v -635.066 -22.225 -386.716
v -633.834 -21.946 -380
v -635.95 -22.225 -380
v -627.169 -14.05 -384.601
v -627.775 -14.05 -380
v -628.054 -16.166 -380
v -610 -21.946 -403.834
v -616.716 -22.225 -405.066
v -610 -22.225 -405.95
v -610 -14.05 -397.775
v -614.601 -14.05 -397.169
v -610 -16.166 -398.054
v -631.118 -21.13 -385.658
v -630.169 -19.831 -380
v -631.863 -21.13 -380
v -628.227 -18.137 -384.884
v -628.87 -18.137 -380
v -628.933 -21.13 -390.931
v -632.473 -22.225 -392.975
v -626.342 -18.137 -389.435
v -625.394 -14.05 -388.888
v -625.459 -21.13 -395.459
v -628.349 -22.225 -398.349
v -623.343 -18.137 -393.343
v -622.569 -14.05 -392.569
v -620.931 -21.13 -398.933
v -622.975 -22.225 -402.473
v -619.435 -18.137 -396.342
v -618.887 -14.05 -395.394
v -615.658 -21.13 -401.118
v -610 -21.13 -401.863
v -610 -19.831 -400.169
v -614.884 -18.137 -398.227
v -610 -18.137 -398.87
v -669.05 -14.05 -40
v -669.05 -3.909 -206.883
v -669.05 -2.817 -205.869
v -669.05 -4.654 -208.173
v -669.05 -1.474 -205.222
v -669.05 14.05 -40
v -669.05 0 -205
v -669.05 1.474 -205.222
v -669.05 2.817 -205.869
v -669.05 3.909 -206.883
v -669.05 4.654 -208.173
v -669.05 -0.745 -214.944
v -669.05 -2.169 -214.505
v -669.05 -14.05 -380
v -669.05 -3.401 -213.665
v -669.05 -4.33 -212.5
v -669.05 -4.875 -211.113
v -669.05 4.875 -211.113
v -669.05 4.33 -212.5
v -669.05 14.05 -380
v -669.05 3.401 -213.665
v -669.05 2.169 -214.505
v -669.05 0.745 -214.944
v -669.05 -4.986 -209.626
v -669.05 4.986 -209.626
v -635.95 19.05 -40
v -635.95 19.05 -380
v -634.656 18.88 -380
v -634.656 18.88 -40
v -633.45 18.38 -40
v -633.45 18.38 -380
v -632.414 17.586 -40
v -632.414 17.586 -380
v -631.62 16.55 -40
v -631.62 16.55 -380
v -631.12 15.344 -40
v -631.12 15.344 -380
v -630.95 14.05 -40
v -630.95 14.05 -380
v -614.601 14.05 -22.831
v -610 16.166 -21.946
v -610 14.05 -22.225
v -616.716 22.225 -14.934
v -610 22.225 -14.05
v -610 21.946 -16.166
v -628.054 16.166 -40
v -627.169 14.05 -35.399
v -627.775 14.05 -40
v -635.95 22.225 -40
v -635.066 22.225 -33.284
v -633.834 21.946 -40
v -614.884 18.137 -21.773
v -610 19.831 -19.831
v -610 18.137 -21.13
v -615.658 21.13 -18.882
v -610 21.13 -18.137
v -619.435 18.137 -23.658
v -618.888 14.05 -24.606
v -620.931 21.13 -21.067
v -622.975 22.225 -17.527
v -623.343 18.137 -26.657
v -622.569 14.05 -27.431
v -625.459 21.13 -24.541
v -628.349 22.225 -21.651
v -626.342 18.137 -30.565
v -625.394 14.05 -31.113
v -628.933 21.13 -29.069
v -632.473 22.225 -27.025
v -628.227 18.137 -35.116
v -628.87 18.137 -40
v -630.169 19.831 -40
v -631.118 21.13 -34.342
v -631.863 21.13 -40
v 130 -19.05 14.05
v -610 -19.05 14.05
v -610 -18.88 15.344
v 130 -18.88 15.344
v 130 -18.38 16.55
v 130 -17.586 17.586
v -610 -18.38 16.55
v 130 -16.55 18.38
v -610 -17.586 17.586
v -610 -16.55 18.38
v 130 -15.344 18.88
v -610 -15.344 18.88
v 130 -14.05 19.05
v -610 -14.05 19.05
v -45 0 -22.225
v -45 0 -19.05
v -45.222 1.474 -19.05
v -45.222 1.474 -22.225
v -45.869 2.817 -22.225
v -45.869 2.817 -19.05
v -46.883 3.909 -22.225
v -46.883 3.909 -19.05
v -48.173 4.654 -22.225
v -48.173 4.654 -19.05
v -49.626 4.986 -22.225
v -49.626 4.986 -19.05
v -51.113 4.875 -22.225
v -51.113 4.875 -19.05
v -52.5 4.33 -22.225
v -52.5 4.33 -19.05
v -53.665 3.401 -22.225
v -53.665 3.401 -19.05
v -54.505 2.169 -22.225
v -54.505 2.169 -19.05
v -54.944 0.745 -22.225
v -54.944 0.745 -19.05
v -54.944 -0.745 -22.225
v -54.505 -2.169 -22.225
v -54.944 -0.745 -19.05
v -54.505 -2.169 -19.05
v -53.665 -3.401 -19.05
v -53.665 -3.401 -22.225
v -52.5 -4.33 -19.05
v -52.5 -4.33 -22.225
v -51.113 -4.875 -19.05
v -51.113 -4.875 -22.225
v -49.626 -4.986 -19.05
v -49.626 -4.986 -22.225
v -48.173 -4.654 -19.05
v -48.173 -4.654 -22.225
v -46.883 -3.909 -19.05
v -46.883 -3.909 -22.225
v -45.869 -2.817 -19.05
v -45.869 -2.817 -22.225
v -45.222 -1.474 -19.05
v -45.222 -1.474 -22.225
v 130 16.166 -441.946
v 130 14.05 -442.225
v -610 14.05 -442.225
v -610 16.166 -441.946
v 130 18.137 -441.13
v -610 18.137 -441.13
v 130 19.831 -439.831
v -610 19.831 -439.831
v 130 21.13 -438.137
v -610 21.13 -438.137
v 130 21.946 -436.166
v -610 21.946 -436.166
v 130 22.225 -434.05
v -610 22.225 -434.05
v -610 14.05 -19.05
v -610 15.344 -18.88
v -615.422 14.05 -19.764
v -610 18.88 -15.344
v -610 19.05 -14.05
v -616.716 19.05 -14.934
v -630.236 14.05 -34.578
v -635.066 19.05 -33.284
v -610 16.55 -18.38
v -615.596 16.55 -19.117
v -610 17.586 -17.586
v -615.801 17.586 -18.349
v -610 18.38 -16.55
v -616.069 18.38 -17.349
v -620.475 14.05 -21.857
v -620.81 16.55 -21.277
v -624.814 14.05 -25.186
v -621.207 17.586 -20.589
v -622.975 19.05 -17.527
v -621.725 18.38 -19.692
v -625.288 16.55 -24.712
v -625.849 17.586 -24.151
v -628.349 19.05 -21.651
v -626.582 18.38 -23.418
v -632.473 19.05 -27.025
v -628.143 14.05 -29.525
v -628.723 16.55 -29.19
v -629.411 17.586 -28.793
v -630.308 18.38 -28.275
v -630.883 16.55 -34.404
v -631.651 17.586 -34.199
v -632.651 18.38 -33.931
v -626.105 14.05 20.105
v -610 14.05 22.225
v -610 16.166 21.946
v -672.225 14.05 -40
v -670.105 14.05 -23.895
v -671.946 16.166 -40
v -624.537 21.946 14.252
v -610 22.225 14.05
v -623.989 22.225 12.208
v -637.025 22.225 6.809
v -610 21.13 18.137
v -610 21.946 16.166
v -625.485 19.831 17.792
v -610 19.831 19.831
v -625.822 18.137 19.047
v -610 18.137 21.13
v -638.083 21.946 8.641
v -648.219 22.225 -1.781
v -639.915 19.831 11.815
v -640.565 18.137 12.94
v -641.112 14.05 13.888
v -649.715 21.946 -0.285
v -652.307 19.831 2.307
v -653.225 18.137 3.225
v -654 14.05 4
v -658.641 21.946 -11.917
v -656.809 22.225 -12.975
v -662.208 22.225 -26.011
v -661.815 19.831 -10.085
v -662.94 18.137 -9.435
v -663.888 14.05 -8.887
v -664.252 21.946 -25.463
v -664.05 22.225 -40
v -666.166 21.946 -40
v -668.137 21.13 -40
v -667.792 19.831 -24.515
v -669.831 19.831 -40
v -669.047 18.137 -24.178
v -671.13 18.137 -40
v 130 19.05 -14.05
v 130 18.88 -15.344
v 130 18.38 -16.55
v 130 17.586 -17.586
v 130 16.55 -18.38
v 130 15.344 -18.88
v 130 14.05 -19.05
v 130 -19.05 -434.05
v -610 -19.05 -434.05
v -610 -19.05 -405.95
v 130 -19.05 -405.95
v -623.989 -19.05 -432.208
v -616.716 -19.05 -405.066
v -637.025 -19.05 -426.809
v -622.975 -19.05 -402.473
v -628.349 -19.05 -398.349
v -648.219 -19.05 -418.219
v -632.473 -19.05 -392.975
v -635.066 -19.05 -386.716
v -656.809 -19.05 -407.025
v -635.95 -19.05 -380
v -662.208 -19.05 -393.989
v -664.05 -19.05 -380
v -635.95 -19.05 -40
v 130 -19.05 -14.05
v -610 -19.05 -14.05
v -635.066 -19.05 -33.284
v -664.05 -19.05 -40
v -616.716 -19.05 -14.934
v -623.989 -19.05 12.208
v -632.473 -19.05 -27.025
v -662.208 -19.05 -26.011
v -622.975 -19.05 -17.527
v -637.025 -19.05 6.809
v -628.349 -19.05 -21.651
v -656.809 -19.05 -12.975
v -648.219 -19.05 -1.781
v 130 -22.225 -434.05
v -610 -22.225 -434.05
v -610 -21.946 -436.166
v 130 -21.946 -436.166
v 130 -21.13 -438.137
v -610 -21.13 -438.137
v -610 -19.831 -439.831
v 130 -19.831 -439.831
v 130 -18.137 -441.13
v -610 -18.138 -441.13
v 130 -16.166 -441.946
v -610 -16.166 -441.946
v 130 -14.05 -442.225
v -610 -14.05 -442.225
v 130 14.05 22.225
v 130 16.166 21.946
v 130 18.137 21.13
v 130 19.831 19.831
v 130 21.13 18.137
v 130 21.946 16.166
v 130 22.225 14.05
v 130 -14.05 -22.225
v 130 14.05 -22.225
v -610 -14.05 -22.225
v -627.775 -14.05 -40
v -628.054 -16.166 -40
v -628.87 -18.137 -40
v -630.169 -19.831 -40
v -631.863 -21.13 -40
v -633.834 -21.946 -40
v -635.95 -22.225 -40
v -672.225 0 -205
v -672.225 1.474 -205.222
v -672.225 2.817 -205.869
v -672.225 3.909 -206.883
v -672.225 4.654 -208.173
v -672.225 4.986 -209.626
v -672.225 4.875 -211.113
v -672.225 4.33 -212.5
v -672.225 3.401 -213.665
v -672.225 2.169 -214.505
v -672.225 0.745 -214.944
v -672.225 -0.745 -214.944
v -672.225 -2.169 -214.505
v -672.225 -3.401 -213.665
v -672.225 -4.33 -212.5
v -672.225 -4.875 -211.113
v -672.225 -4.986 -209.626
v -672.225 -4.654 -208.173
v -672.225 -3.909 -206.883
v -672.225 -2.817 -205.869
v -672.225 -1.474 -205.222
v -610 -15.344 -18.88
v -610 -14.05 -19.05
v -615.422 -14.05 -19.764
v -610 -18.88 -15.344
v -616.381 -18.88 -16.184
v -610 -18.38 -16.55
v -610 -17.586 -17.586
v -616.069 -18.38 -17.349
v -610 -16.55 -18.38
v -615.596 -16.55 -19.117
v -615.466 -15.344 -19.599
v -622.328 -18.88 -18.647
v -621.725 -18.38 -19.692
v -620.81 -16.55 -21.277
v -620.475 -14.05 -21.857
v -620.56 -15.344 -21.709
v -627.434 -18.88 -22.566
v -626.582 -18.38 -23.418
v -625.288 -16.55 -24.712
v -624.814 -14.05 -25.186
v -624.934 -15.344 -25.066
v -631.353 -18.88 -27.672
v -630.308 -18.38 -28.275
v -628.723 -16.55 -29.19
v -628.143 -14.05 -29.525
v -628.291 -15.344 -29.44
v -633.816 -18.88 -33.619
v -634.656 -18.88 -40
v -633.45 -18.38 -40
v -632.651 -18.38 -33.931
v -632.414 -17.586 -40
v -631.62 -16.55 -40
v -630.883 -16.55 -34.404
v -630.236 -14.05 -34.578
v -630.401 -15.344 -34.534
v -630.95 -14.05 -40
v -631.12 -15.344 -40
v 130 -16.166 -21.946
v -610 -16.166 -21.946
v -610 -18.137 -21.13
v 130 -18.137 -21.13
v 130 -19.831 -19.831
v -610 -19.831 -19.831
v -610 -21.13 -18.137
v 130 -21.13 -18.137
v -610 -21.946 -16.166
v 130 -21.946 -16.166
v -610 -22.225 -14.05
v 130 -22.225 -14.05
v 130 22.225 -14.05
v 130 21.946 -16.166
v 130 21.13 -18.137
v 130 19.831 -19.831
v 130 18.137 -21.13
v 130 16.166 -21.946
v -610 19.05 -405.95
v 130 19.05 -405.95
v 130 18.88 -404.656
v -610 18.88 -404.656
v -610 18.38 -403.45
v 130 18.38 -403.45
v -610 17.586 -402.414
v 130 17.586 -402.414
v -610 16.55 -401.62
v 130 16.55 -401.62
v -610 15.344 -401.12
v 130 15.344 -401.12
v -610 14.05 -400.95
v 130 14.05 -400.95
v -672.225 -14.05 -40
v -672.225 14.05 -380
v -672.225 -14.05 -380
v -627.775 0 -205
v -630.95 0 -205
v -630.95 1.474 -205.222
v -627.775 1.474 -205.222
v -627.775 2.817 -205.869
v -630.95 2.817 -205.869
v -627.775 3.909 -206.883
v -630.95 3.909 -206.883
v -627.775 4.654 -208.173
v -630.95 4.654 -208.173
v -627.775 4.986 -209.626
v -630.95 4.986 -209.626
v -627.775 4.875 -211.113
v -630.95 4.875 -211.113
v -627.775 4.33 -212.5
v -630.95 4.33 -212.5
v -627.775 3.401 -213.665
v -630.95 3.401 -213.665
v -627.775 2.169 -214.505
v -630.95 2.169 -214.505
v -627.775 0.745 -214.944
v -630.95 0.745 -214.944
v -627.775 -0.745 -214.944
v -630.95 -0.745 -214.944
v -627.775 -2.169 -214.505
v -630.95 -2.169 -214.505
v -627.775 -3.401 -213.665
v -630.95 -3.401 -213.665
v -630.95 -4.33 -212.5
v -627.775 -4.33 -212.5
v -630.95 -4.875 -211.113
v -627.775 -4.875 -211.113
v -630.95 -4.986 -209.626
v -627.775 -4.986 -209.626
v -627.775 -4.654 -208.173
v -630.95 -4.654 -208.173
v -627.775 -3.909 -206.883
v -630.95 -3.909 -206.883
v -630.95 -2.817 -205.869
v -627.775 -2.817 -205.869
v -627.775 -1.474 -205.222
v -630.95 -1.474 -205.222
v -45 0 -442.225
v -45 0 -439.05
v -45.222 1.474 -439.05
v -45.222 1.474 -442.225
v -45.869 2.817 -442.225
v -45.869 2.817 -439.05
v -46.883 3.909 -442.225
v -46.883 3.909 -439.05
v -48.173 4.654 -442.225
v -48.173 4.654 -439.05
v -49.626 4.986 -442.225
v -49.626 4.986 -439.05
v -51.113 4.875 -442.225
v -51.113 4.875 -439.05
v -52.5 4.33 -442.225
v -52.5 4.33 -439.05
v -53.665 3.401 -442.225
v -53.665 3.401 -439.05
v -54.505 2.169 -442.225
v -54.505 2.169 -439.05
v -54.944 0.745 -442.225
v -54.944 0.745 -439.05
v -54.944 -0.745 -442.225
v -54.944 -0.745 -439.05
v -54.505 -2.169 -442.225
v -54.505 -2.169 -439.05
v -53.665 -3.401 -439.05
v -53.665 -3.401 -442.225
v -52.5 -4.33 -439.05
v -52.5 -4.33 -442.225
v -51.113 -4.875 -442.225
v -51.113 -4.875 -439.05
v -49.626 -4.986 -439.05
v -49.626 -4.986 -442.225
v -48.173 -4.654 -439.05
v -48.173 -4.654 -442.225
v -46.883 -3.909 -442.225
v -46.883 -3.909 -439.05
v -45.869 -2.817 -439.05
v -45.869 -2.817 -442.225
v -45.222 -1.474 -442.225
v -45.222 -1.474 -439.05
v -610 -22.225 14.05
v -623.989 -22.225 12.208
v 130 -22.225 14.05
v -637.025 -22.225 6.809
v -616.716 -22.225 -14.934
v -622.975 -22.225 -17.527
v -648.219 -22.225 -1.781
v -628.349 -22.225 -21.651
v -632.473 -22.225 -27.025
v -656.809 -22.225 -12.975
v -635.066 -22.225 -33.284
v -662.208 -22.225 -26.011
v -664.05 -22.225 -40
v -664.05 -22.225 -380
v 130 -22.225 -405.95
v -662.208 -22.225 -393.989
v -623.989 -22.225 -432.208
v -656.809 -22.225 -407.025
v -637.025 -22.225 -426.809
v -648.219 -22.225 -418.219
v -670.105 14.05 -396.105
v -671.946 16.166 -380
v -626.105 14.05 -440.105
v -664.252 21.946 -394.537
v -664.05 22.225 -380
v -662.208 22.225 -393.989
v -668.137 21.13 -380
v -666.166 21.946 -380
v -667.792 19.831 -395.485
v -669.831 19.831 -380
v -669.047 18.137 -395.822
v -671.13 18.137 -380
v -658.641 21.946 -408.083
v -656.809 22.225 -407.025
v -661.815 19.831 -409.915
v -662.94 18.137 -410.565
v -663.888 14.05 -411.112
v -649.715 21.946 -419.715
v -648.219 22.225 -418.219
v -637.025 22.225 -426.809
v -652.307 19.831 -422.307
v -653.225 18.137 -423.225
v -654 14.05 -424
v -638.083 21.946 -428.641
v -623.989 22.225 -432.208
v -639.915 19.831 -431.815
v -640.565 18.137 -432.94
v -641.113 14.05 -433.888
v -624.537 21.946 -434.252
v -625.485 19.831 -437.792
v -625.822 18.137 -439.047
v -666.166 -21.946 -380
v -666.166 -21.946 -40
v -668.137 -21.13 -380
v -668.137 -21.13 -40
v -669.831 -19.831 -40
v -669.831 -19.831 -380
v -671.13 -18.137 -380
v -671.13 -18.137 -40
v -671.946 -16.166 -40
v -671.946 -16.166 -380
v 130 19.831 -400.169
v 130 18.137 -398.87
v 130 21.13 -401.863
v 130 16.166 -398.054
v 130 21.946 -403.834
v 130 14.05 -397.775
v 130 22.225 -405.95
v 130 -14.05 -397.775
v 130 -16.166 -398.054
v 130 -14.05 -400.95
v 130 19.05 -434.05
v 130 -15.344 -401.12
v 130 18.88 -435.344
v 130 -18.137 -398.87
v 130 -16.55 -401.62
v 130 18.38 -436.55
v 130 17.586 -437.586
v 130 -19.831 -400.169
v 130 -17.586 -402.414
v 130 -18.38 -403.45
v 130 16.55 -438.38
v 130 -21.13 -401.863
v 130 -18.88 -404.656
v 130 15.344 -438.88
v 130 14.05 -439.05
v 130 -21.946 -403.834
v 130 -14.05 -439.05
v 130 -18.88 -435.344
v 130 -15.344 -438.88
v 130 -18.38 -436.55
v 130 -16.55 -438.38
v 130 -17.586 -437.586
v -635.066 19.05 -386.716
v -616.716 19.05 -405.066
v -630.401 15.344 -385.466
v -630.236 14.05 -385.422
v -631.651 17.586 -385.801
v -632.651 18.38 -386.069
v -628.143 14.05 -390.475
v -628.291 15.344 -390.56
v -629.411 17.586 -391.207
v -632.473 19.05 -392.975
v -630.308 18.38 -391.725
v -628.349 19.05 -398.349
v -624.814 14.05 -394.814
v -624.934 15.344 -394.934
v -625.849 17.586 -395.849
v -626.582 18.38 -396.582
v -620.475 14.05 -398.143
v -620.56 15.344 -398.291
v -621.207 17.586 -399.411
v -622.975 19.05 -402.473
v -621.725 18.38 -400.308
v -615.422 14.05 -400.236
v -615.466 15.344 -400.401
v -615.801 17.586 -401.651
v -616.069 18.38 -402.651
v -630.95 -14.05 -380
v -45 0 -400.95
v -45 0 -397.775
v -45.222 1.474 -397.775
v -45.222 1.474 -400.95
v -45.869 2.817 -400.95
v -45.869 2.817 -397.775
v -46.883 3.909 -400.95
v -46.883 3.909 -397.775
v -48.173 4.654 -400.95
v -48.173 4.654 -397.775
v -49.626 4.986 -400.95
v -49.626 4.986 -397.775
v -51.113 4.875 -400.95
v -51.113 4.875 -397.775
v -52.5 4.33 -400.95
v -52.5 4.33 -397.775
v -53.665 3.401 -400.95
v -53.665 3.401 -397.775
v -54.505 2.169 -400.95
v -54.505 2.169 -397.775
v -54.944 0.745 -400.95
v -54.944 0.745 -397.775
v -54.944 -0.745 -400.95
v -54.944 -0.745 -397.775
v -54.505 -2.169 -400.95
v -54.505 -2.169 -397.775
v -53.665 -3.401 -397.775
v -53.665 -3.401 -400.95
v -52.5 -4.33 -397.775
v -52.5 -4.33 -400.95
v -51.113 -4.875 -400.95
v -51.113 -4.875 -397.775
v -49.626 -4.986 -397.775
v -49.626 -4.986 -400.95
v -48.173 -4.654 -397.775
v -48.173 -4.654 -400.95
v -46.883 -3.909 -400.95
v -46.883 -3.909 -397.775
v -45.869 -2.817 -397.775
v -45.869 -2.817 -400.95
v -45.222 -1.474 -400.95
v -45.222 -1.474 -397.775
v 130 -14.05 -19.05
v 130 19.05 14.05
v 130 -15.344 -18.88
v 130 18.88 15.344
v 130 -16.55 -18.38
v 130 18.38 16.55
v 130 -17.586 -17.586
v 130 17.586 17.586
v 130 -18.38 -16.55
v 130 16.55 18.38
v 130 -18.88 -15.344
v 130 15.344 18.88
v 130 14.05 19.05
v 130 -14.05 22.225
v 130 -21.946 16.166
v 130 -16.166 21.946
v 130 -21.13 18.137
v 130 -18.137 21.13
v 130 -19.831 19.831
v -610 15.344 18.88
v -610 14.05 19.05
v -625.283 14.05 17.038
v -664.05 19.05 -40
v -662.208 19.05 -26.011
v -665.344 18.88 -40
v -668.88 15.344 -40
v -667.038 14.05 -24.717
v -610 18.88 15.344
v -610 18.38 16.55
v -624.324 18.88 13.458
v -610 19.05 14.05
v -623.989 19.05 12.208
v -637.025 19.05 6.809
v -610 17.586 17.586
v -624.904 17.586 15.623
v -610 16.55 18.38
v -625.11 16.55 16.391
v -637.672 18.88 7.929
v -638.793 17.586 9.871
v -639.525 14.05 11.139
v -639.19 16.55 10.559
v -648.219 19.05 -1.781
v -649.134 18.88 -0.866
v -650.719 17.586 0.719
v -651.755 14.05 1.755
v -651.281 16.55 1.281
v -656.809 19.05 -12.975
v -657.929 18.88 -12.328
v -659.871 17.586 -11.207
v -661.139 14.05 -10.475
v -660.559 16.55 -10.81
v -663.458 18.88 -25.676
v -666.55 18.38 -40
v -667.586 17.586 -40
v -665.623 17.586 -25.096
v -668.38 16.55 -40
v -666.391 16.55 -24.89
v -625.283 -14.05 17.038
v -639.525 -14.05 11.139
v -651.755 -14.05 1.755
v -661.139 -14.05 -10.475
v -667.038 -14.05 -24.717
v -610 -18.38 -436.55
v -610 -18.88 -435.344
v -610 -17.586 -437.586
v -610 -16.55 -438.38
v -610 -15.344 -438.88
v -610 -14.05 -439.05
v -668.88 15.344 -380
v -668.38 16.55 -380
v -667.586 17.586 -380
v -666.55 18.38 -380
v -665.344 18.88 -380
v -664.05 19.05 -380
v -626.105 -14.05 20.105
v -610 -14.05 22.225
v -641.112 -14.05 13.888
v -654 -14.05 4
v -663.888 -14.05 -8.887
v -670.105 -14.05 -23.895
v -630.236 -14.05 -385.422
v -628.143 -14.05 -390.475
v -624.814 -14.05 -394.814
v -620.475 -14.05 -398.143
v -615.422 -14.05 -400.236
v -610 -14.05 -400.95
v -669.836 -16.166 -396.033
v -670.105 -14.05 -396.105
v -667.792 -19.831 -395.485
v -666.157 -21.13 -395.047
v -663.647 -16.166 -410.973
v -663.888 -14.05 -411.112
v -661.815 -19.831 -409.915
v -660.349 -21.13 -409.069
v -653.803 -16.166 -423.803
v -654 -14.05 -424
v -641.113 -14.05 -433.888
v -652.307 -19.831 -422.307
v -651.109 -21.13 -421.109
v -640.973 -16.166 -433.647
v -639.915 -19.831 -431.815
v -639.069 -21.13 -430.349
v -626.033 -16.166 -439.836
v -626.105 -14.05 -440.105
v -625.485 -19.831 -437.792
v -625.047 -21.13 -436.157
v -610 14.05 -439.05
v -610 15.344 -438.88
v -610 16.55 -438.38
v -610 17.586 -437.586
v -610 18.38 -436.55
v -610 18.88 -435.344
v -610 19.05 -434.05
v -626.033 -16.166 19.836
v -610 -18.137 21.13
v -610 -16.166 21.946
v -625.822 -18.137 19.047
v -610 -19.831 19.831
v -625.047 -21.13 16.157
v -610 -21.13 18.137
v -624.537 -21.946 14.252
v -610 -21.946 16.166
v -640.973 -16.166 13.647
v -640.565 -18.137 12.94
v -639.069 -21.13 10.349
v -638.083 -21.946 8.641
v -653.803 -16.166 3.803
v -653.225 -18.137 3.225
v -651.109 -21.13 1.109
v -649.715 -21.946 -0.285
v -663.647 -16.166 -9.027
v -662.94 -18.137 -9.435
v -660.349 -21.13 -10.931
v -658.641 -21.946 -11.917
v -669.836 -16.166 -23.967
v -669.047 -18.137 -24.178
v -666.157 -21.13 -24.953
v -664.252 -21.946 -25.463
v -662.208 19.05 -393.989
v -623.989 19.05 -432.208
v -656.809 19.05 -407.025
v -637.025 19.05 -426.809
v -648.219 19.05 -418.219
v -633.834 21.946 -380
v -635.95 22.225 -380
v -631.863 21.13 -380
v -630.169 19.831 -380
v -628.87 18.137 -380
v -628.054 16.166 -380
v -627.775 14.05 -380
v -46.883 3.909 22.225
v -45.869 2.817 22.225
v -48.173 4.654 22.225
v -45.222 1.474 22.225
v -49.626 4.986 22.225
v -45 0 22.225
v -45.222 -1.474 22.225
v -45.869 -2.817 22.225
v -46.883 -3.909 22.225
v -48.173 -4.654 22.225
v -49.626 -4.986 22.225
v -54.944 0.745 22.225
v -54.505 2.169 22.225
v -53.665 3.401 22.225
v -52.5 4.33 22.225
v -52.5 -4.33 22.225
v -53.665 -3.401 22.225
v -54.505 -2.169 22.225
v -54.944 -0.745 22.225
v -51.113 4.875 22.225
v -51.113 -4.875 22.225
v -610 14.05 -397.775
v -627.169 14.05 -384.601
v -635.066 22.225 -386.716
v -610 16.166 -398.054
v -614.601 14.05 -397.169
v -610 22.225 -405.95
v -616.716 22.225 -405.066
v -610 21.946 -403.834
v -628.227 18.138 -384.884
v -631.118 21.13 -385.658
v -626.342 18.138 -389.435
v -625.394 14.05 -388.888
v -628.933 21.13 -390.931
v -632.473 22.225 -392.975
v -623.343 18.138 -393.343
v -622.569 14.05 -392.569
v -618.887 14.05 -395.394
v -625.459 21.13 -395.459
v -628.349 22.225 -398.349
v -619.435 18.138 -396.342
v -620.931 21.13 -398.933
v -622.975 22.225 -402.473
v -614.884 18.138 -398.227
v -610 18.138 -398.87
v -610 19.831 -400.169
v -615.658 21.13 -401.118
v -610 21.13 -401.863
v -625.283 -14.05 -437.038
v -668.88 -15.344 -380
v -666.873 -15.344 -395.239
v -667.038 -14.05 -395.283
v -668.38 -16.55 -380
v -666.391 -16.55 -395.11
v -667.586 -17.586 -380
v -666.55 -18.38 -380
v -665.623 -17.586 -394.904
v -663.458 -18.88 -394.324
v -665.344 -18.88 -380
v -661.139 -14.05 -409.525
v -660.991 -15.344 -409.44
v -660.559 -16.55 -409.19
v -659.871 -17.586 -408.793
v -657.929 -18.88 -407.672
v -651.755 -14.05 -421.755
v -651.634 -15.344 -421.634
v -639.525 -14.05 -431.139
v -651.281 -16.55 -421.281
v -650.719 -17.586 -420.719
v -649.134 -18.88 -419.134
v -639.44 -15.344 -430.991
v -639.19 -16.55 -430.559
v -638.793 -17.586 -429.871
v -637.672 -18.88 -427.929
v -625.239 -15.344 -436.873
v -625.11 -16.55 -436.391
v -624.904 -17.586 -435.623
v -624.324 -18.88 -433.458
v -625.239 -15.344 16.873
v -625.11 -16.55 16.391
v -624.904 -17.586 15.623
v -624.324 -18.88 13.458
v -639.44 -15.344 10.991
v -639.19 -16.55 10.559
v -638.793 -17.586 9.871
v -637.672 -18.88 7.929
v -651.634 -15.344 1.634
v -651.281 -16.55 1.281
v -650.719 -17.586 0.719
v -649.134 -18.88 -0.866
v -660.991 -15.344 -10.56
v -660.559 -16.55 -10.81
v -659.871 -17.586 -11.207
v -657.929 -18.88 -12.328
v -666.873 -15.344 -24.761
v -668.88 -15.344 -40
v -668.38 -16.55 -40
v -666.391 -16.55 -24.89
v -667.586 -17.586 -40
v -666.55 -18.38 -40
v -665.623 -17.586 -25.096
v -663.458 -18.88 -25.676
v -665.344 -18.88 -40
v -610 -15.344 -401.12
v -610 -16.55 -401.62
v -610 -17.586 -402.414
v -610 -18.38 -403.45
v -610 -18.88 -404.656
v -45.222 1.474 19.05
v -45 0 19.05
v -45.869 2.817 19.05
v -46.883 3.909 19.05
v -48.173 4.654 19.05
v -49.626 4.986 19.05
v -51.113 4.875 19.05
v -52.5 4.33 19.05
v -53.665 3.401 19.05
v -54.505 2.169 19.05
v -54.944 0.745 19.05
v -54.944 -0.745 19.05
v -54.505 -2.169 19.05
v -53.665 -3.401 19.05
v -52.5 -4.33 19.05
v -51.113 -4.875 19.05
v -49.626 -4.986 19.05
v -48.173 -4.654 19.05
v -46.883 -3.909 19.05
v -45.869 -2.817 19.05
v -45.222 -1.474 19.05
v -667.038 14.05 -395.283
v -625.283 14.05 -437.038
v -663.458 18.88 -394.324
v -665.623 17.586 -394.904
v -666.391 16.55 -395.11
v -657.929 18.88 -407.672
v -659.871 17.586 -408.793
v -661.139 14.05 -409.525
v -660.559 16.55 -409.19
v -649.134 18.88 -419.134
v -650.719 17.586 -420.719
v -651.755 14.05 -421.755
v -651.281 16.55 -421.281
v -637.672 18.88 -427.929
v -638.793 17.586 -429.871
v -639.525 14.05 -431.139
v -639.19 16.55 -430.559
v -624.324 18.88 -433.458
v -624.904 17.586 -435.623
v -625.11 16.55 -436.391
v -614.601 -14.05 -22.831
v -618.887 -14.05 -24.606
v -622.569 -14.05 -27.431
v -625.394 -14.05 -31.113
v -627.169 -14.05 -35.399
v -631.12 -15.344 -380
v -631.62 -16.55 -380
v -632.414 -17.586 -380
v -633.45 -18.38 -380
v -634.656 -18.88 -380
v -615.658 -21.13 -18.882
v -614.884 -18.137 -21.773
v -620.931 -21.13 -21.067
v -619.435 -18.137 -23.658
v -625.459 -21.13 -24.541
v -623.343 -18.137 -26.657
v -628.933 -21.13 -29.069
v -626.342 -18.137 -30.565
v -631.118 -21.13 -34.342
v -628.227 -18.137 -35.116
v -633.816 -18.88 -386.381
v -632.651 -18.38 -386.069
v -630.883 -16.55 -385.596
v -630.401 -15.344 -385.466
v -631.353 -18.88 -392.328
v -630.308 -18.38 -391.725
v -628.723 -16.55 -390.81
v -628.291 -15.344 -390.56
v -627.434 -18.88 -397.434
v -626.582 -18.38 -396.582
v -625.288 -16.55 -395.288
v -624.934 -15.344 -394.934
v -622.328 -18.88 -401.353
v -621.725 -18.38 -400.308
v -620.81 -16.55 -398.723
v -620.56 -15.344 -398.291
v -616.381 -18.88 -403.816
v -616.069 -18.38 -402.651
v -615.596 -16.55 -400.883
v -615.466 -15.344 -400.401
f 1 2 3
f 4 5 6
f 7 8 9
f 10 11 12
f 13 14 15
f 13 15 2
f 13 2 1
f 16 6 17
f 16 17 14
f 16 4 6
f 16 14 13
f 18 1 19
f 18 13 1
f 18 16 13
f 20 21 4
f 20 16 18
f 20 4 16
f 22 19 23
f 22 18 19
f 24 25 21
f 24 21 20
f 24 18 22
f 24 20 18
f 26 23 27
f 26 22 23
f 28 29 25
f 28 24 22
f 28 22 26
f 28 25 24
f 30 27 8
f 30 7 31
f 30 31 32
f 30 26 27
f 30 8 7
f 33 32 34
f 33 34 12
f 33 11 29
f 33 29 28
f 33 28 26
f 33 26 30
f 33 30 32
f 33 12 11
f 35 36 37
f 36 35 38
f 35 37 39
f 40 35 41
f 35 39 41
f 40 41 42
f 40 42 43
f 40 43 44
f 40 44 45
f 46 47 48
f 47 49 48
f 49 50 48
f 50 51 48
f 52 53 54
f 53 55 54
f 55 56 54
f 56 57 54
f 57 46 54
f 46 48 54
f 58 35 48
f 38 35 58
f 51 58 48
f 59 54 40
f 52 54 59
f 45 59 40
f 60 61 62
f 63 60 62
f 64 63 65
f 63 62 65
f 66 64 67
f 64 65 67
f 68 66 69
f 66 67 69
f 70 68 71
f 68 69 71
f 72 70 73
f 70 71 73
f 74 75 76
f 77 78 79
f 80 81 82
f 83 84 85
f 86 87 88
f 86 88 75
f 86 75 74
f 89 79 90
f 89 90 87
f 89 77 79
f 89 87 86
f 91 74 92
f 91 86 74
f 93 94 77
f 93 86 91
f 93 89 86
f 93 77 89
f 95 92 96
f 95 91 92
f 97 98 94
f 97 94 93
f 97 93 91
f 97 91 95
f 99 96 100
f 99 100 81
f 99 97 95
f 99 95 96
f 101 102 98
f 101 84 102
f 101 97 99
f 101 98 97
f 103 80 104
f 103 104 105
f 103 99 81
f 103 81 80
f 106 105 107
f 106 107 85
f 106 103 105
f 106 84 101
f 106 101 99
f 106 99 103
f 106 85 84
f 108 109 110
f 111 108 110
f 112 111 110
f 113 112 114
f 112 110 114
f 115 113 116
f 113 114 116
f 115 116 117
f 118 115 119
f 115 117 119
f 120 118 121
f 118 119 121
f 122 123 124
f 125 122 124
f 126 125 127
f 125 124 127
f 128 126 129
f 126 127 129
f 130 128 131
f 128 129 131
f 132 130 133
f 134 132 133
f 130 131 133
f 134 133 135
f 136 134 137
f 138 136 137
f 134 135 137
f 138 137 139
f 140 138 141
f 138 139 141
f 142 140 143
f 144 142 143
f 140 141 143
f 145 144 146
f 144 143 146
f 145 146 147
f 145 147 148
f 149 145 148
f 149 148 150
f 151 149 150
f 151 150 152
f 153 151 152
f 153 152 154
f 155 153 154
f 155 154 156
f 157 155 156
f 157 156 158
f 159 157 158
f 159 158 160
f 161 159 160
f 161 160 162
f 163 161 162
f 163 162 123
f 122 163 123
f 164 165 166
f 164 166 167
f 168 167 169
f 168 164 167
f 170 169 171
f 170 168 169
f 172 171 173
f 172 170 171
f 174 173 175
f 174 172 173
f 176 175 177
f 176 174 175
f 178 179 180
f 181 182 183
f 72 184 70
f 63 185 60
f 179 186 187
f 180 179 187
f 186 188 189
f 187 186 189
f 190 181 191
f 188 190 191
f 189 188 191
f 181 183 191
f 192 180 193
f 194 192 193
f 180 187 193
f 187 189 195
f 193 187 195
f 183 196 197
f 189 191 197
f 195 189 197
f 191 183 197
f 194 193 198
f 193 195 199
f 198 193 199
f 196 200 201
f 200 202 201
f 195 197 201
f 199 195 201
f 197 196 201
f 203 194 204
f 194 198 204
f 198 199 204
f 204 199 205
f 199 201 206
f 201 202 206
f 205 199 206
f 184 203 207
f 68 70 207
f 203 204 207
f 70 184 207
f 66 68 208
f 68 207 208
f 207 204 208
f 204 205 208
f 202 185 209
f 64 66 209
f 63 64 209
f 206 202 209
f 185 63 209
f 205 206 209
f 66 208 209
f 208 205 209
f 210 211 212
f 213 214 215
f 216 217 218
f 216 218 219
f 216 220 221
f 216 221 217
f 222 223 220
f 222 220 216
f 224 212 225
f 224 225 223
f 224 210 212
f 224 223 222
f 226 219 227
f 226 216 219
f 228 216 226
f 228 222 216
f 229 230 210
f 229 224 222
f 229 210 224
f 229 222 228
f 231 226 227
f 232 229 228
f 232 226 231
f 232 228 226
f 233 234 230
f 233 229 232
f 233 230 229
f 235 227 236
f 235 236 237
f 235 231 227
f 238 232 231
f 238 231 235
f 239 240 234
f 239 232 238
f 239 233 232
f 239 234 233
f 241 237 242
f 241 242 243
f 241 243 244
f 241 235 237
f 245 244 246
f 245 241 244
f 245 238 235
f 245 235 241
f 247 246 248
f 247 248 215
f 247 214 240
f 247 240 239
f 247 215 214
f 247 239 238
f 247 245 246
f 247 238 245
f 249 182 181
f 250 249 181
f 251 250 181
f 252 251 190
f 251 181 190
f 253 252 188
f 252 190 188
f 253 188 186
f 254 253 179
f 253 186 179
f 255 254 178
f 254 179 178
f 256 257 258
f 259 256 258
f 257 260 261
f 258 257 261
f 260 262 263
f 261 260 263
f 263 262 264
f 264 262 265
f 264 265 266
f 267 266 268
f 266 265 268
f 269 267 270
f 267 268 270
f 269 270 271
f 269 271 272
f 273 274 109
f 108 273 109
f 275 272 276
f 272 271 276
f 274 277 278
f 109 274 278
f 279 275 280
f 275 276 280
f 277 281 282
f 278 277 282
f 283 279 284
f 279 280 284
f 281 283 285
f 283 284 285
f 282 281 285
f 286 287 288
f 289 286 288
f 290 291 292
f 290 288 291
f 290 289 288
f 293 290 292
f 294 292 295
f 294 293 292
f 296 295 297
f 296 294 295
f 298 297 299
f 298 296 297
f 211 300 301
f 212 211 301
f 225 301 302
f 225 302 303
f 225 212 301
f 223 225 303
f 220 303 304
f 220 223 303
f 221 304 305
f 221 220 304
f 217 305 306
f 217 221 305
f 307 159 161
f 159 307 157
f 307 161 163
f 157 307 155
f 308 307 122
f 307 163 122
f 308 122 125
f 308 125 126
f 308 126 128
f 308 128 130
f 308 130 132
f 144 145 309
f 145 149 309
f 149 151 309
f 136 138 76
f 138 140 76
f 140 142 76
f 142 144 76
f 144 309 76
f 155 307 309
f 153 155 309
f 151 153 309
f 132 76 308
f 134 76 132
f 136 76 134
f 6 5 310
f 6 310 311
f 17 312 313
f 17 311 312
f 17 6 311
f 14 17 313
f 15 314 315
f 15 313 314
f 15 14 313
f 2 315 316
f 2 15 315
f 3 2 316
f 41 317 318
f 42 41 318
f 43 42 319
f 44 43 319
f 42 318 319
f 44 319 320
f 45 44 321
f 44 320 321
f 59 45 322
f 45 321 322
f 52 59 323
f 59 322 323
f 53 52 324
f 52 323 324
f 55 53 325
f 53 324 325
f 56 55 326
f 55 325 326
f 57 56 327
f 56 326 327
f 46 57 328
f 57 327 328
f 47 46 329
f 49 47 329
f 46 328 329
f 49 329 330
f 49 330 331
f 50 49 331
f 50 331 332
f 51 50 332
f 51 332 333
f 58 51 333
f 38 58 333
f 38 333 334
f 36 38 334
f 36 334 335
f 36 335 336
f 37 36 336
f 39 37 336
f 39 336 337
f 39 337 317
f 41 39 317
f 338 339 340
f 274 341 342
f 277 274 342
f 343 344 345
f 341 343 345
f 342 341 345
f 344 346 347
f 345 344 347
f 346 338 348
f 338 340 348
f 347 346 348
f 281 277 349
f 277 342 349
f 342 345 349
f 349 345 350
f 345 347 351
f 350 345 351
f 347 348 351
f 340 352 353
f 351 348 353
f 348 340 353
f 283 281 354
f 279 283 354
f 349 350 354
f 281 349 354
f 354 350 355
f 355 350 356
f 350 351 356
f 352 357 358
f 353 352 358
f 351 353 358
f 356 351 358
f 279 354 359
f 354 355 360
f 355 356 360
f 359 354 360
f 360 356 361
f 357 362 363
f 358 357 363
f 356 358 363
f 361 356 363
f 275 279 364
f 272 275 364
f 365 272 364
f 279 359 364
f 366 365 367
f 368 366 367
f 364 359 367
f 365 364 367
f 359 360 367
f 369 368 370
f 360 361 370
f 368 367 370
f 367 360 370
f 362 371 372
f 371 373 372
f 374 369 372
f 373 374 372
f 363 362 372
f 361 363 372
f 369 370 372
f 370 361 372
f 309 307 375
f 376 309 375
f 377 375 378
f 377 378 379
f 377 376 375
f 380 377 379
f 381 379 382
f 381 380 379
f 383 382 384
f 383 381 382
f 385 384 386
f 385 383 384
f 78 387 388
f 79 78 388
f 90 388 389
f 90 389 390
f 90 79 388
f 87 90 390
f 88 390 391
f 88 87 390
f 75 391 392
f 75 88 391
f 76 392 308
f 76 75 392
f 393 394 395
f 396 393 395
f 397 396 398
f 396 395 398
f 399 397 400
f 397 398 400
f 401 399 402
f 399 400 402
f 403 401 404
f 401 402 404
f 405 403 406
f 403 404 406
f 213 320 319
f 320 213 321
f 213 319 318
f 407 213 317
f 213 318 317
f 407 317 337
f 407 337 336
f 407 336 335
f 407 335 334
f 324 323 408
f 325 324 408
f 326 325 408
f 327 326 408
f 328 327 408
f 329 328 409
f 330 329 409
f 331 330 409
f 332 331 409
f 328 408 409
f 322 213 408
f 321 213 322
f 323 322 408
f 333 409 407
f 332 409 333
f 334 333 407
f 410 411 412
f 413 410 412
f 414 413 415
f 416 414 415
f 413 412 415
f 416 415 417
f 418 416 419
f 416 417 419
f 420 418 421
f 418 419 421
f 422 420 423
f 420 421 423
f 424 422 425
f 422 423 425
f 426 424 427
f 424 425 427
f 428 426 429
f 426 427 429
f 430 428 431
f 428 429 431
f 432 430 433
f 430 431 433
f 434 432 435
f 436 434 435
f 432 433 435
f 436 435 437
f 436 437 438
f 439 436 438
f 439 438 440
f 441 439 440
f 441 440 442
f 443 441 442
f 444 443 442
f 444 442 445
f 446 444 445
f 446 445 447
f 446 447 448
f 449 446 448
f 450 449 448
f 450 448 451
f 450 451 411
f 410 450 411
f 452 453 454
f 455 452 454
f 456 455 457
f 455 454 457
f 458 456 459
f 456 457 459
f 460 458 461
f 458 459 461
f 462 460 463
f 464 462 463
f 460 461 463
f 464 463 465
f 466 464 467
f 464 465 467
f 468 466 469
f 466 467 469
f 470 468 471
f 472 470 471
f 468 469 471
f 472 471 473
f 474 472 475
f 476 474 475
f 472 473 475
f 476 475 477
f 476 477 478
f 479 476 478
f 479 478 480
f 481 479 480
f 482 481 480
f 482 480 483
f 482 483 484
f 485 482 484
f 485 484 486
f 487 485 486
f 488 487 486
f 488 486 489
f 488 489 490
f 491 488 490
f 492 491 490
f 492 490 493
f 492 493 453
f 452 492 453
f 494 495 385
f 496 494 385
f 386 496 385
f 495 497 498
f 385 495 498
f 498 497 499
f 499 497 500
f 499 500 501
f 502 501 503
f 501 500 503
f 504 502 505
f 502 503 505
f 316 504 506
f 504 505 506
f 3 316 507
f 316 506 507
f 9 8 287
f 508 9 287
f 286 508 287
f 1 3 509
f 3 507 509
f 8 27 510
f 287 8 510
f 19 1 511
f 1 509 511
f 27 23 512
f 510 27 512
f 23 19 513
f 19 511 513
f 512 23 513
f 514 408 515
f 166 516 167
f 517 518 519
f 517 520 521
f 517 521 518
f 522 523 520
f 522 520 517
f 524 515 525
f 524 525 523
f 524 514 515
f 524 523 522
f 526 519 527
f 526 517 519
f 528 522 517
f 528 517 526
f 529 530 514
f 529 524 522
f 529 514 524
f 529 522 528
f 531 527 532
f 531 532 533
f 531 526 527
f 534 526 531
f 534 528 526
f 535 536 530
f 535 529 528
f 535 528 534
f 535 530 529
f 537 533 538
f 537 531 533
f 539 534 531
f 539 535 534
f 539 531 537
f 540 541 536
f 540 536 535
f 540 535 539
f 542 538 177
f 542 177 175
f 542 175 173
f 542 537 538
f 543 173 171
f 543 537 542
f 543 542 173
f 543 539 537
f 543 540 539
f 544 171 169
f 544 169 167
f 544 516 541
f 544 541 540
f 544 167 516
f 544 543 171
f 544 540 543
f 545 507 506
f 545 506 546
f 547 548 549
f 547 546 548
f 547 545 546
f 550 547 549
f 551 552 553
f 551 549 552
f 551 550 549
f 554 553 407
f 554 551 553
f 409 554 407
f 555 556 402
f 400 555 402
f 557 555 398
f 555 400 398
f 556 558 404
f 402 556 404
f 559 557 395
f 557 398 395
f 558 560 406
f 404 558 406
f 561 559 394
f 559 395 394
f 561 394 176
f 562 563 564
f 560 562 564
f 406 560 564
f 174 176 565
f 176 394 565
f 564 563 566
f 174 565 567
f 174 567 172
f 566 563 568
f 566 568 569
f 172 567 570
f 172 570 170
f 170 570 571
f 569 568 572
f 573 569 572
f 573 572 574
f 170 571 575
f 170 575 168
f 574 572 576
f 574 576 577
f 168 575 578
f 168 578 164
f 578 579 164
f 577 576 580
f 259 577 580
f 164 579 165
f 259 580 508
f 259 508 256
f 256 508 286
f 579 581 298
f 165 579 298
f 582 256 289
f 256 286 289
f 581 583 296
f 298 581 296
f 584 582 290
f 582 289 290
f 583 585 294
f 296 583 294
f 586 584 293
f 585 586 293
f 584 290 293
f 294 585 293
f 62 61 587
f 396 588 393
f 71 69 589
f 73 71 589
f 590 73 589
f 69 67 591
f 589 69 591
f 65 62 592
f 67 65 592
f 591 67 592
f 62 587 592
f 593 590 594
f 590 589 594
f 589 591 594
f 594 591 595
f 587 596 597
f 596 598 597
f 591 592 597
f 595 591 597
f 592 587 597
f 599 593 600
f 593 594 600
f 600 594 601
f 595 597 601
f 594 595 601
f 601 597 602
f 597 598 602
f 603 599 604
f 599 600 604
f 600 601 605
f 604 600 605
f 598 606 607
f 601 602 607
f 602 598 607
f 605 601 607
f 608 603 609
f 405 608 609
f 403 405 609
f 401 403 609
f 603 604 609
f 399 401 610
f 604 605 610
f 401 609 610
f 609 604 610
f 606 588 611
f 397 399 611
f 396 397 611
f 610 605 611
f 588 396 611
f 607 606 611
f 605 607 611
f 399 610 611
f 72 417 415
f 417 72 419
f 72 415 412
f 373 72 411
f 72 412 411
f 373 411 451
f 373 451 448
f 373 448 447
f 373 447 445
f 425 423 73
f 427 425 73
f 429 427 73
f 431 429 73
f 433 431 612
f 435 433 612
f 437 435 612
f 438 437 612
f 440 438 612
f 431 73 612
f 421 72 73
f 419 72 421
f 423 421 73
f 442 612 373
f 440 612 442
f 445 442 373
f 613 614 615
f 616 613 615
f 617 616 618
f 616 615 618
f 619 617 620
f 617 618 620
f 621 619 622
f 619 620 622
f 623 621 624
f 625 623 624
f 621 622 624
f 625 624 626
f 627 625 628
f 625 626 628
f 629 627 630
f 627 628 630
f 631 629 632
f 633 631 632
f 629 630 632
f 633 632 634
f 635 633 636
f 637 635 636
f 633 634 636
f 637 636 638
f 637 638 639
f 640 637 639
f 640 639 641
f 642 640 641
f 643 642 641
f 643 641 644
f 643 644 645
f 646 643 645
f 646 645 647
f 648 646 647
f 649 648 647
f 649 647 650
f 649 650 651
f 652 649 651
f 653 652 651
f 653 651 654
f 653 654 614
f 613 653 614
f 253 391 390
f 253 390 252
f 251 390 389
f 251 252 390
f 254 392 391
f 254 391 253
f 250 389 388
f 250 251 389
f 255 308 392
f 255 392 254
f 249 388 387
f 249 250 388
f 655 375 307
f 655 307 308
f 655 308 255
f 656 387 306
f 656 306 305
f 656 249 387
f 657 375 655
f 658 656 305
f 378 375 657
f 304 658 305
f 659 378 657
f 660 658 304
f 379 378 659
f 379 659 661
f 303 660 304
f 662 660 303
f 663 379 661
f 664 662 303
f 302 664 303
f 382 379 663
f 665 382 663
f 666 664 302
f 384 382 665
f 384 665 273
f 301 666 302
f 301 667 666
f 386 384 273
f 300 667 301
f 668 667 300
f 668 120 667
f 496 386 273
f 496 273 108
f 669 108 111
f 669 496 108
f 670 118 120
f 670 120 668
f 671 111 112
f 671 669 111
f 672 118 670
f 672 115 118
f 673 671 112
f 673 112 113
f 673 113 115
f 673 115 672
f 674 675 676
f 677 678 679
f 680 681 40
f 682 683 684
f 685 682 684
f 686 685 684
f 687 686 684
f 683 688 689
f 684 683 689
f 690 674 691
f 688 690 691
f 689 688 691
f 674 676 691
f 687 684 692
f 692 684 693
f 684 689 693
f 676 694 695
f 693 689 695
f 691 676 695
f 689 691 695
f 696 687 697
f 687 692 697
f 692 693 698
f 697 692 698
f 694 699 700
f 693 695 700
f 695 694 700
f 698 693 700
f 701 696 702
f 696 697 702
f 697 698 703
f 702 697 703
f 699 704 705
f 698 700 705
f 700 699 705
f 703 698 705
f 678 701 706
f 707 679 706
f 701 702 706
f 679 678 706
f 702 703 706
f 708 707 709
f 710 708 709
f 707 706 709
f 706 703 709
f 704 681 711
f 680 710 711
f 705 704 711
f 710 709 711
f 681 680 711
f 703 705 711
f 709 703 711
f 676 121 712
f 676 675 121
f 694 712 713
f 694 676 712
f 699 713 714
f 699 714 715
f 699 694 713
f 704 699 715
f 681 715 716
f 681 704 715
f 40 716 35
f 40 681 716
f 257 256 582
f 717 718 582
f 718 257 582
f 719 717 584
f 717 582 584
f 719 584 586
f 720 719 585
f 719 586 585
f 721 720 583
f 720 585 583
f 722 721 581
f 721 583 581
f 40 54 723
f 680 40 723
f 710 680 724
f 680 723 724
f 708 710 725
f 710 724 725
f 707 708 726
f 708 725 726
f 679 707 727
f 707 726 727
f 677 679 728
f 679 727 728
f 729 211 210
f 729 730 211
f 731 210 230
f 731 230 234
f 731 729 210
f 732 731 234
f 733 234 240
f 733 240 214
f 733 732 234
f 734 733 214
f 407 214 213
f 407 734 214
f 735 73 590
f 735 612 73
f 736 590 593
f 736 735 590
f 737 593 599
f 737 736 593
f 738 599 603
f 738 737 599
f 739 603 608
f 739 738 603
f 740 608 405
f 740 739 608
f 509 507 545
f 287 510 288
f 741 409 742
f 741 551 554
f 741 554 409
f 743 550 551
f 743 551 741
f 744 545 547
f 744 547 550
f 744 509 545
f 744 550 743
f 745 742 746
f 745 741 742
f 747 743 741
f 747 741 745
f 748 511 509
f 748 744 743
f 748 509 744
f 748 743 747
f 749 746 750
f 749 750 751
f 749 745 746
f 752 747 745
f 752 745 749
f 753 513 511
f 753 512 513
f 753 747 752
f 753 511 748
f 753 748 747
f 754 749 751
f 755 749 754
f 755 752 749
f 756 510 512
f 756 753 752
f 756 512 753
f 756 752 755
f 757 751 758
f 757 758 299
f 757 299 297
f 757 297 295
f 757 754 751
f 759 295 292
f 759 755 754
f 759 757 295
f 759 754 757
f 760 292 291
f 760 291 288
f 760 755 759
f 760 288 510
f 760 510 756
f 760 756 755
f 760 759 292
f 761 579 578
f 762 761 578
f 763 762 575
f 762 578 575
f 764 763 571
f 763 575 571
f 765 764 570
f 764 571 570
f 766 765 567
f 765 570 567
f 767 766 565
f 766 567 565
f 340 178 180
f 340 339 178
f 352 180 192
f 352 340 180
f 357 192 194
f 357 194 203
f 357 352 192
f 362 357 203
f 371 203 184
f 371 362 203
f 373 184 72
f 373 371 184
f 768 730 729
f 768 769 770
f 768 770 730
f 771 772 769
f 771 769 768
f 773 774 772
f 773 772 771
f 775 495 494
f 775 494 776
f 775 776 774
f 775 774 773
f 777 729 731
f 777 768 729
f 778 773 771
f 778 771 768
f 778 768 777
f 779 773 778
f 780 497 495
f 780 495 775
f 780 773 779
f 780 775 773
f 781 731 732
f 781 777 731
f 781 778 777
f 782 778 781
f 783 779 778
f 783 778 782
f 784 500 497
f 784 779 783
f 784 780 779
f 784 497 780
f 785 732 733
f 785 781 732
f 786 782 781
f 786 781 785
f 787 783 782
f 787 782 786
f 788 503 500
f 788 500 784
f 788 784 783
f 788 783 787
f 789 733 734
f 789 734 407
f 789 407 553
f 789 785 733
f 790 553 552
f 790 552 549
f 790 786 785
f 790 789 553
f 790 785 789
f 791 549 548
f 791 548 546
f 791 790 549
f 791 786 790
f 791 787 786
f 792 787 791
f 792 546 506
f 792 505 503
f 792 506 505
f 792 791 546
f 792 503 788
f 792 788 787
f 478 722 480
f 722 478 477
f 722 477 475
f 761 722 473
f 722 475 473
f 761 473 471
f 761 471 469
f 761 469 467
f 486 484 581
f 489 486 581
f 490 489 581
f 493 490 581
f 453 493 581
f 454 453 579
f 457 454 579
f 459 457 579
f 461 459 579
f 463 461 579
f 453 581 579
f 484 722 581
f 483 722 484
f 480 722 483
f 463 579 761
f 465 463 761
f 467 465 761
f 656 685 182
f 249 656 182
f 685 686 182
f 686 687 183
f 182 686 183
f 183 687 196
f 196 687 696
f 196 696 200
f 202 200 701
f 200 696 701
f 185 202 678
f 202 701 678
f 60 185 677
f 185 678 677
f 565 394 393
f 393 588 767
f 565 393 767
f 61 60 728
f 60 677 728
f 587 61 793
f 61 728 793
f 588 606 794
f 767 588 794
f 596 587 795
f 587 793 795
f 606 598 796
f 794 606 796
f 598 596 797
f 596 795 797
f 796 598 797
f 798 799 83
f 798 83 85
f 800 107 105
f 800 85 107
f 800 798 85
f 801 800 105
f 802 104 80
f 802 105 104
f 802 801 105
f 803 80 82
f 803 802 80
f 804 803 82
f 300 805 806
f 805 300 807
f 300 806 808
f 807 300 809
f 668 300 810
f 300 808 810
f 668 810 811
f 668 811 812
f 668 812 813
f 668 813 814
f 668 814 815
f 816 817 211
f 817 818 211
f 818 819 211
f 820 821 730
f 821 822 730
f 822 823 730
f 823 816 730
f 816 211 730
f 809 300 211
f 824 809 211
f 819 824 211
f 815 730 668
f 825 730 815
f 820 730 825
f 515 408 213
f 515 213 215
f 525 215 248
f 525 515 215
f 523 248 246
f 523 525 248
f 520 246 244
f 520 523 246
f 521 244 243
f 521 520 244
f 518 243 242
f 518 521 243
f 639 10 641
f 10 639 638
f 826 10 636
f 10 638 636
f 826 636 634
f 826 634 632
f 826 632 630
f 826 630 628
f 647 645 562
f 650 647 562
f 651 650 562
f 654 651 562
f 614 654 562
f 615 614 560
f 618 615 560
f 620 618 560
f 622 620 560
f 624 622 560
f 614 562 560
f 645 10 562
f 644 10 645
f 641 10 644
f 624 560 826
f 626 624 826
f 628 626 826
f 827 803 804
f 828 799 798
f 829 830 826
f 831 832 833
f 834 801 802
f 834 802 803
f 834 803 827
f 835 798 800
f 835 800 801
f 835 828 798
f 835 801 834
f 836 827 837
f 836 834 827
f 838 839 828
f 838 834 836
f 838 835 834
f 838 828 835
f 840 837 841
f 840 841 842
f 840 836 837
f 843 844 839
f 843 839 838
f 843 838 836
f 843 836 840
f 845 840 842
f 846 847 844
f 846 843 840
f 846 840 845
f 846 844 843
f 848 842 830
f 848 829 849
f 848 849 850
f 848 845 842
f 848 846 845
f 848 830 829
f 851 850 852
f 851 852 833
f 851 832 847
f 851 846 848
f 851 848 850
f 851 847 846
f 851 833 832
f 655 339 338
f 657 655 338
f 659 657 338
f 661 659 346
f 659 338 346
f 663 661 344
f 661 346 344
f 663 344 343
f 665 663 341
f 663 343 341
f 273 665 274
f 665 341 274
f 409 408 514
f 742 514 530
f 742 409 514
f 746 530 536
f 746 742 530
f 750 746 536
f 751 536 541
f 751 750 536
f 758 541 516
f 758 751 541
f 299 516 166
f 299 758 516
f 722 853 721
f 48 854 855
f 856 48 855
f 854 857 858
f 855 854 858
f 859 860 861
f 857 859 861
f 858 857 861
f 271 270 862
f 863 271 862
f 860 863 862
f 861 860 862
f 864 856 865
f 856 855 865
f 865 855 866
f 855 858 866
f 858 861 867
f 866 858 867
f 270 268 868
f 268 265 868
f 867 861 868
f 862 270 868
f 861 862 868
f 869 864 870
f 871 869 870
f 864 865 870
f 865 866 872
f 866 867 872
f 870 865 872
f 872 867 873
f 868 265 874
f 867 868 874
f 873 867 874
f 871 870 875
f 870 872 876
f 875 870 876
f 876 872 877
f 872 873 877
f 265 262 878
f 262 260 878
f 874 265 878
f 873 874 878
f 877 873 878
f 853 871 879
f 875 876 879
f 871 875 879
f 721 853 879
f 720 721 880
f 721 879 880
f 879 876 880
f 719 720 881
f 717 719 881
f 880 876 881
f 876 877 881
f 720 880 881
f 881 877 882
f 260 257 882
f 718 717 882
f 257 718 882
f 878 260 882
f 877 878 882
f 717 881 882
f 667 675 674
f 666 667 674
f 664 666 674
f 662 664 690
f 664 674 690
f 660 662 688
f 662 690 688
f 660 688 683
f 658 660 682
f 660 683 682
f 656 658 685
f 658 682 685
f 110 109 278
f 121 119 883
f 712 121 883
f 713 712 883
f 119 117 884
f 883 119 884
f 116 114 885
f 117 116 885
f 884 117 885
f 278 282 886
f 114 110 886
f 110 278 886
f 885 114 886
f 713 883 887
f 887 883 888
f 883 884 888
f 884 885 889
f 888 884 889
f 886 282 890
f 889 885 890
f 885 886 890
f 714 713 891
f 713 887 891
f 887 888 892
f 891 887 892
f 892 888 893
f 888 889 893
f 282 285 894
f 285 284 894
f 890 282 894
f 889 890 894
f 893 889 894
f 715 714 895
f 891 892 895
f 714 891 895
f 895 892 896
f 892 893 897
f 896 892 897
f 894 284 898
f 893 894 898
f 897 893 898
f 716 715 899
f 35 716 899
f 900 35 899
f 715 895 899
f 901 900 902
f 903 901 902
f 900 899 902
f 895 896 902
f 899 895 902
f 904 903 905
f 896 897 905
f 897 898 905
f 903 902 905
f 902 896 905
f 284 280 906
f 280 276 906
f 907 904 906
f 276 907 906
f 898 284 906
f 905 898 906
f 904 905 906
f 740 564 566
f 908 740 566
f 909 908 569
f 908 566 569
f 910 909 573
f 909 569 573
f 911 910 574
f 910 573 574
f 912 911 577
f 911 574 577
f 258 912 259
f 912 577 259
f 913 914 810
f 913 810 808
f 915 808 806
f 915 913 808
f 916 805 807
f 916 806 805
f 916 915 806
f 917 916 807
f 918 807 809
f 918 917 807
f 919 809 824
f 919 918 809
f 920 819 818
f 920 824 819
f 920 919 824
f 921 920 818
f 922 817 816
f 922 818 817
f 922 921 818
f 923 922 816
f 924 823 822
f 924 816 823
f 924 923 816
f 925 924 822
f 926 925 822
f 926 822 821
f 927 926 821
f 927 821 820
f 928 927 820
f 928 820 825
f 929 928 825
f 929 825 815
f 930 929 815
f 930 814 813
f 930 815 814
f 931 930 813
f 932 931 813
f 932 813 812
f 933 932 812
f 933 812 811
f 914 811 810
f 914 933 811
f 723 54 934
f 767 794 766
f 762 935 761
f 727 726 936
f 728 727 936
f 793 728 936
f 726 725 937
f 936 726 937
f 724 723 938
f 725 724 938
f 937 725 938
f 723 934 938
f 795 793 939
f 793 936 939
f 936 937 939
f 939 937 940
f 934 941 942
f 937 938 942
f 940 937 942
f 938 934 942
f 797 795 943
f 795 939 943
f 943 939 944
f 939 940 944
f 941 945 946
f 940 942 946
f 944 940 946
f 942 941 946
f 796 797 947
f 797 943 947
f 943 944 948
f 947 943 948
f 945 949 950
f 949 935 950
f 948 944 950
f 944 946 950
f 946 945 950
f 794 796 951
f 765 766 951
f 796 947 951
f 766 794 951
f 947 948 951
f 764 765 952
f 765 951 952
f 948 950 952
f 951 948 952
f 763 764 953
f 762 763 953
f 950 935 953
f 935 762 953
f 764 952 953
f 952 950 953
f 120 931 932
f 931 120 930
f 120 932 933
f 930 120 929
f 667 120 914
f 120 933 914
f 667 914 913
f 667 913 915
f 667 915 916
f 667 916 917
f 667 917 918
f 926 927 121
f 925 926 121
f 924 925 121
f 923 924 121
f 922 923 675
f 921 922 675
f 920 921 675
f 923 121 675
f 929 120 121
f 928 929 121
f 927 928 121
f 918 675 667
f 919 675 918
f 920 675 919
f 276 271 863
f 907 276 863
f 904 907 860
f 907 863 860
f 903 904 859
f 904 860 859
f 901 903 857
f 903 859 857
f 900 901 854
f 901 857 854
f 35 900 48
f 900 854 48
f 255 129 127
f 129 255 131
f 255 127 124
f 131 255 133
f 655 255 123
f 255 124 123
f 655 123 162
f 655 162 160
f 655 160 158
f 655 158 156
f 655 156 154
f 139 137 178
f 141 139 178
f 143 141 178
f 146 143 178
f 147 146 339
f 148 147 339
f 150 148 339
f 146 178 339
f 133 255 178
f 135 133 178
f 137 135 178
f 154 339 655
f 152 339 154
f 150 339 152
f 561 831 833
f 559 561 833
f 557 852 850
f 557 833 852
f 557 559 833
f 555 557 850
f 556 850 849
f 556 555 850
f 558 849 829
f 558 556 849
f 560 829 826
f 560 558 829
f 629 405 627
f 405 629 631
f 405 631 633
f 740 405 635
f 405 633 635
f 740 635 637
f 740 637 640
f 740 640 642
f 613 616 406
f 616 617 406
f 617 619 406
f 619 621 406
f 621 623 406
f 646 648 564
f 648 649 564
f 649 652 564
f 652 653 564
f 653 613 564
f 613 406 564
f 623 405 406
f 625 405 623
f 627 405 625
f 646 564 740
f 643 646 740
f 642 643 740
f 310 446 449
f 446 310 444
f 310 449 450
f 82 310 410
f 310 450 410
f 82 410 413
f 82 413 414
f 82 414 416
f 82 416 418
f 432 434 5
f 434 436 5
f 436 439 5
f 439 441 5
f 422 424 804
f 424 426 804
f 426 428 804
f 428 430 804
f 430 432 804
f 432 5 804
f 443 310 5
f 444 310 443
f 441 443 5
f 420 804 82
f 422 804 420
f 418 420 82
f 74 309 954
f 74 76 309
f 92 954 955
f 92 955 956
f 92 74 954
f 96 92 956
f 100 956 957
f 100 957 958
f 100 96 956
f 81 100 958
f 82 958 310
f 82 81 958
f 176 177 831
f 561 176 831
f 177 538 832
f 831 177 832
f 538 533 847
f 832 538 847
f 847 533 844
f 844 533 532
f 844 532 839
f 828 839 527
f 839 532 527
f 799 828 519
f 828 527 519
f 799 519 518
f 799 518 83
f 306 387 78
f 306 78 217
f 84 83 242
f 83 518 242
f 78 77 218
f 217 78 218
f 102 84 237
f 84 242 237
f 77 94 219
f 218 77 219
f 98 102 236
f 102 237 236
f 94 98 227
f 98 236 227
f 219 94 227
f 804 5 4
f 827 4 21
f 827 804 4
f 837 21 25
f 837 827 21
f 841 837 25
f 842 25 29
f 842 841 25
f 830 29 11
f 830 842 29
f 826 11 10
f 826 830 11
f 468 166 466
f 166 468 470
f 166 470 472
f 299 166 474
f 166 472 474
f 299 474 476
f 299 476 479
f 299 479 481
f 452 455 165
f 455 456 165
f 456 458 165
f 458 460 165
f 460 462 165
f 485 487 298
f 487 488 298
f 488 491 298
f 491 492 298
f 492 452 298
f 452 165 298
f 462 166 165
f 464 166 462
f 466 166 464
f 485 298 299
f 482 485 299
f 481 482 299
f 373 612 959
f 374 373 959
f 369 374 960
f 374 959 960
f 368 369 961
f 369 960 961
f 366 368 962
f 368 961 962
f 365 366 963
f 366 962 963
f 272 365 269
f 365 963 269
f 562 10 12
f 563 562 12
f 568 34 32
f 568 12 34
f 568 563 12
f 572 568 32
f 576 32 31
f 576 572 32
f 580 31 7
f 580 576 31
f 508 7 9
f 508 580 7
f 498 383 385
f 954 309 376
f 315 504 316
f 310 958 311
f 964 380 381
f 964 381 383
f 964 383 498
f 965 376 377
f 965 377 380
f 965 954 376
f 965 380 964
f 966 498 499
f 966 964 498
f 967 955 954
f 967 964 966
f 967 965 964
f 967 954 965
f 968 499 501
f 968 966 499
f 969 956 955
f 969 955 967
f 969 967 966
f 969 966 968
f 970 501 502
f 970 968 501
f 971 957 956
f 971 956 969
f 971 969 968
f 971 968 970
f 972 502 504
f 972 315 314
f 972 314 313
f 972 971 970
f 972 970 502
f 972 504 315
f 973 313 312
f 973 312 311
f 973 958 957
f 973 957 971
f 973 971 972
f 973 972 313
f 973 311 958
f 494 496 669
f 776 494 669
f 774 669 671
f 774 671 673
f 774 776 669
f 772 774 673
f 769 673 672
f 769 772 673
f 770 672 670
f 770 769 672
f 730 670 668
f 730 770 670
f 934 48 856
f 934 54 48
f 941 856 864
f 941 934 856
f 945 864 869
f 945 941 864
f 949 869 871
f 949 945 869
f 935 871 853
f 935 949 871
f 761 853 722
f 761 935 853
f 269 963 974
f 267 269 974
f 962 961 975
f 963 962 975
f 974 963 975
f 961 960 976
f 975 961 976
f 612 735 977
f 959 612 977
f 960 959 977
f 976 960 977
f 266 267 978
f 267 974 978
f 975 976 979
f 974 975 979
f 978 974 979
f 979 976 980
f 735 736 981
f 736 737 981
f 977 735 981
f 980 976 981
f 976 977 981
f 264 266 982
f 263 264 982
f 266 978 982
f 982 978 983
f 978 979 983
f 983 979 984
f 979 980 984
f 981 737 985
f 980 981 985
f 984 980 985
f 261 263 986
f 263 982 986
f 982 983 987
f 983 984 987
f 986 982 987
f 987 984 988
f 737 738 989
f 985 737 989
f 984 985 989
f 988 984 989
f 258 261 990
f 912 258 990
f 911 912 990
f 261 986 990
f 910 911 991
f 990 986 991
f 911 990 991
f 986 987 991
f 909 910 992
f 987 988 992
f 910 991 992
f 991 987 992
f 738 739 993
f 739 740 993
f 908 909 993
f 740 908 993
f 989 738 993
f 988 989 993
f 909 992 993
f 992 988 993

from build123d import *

# Parameters (mm, degrees)
SKETCH3_R               = 5
CUT_EXTRUDE1_DEPTH      = 23.2250001
CUT_EXTRUDE1_DEPTH_BACK = 443.2250001
SKETCH6_R               = 5
CUT_EXTRUDE2_DEPTH      = 803.225


with BuildPart() as part:
    # Sweep-Thin1: sweep along a path in Sketch1
    with BuildLine(Plane(origin=(0, 0, 0), x_dir=(1, 0, 0), z_dir=(0, 1, 0))) as sweep_thin1_path:
        Line((130, 0), (0, 0))
        Line((0, 0), (-610, 0))
        ThreePointArc((-610, 0), (-638.284271247, 11.715728753), (-650, 40))
        Line((-650, 40), (-650, 380))
        ThreePointArc((-650, 380), (-638.284271247, 408.284271247), (-610, 420))
        Line((-610, 420), (0, 420))
        Line((0, 420), (130, 420))
    # Sketch2 → Sweep-Thin1 (sweep)
    with BuildSketch(Plane(origin=(0, 0, 0), x_dir=(0, 0, -1), z_dir=(1, 0, 0))):
        with BuildLine():
            Line((14.05, 22.225), (-14.05, 22.225))
            ThreePointArc((-14.05, 22.225), (-19.830597936, 19.830597936), (-22.225, 14.05))
            Line((-22.225, 14.05), (-22.225, -14.05))
            ThreePointArc((-22.225, -14.05), (-19.830597936, -19.830597936), (-14.05, -22.225))
            Line((-14.05, -22.225), (14.05, -22.225))
            ThreePointArc((14.05, -22.225), (19.830597936, -19.830597936), (22.225, -14.05))
            Line((22.225, -14.05), (22.225, 14.05))
            ThreePointArc((22.225, 14.05), (19.830597936, 19.830597936), (14.05, 22.225))
        make_face()
        with BuildLine():
            Line((14.05, 19.05), (-14.05, 19.05))
            ThreePointArc((-14.05, 19.05), (-17.585533906, 17.585533906), (-19.05, 14.05))
            Line((-19.05, 14.05), (-19.05, -14.05))
            ThreePointArc((-19.05, -14.05), (-17.585533906, -17.585533906), (-14.05, -19.05))
            Line((-14.05, -19.05), (14.05, -19.05))
            ThreePointArc((14.05, -19.05), (17.585533906, -17.585533906), (19.05, -14.05))
            Line((19.05, -14.05), (19.05, 14.05))
            ThreePointArc((19.05, 14.05), (17.585533906, 17.585533906), (14.05, 19.05))
        make_face(mode=Mode.SUBTRACT)
    sweep(path=sweep_thin1_path.line)

    # Sketch3 → Cut-Extrude1 (cut, two sides)
    with BuildSketch(Plane.XY) as cut_extrude1_sk:
        with Locations((-50, 0)):
            Circle(SKETCH3_R)
    extrude(amount=CUT_EXTRUDE1_DEPTH, mode=Mode.SUBTRACT)
    extrude(cut_extrude1_sk.sketch, amount=-CUT_EXTRUDE1_DEPTH_BACK, mode=Mode.SUBTRACT)

    # Sketch6 → Cut-Extrude2 (cut, through all)
    with BuildSketch(Plane.ZY.offset(672.225)):
        with Locations((-210, 0)):
            Circle(SKETCH6_R)
    extrude(amount=-CUT_EXTRUDE2_DEPTH, mode=Mode.SUBTRACT)


solid = part.part
